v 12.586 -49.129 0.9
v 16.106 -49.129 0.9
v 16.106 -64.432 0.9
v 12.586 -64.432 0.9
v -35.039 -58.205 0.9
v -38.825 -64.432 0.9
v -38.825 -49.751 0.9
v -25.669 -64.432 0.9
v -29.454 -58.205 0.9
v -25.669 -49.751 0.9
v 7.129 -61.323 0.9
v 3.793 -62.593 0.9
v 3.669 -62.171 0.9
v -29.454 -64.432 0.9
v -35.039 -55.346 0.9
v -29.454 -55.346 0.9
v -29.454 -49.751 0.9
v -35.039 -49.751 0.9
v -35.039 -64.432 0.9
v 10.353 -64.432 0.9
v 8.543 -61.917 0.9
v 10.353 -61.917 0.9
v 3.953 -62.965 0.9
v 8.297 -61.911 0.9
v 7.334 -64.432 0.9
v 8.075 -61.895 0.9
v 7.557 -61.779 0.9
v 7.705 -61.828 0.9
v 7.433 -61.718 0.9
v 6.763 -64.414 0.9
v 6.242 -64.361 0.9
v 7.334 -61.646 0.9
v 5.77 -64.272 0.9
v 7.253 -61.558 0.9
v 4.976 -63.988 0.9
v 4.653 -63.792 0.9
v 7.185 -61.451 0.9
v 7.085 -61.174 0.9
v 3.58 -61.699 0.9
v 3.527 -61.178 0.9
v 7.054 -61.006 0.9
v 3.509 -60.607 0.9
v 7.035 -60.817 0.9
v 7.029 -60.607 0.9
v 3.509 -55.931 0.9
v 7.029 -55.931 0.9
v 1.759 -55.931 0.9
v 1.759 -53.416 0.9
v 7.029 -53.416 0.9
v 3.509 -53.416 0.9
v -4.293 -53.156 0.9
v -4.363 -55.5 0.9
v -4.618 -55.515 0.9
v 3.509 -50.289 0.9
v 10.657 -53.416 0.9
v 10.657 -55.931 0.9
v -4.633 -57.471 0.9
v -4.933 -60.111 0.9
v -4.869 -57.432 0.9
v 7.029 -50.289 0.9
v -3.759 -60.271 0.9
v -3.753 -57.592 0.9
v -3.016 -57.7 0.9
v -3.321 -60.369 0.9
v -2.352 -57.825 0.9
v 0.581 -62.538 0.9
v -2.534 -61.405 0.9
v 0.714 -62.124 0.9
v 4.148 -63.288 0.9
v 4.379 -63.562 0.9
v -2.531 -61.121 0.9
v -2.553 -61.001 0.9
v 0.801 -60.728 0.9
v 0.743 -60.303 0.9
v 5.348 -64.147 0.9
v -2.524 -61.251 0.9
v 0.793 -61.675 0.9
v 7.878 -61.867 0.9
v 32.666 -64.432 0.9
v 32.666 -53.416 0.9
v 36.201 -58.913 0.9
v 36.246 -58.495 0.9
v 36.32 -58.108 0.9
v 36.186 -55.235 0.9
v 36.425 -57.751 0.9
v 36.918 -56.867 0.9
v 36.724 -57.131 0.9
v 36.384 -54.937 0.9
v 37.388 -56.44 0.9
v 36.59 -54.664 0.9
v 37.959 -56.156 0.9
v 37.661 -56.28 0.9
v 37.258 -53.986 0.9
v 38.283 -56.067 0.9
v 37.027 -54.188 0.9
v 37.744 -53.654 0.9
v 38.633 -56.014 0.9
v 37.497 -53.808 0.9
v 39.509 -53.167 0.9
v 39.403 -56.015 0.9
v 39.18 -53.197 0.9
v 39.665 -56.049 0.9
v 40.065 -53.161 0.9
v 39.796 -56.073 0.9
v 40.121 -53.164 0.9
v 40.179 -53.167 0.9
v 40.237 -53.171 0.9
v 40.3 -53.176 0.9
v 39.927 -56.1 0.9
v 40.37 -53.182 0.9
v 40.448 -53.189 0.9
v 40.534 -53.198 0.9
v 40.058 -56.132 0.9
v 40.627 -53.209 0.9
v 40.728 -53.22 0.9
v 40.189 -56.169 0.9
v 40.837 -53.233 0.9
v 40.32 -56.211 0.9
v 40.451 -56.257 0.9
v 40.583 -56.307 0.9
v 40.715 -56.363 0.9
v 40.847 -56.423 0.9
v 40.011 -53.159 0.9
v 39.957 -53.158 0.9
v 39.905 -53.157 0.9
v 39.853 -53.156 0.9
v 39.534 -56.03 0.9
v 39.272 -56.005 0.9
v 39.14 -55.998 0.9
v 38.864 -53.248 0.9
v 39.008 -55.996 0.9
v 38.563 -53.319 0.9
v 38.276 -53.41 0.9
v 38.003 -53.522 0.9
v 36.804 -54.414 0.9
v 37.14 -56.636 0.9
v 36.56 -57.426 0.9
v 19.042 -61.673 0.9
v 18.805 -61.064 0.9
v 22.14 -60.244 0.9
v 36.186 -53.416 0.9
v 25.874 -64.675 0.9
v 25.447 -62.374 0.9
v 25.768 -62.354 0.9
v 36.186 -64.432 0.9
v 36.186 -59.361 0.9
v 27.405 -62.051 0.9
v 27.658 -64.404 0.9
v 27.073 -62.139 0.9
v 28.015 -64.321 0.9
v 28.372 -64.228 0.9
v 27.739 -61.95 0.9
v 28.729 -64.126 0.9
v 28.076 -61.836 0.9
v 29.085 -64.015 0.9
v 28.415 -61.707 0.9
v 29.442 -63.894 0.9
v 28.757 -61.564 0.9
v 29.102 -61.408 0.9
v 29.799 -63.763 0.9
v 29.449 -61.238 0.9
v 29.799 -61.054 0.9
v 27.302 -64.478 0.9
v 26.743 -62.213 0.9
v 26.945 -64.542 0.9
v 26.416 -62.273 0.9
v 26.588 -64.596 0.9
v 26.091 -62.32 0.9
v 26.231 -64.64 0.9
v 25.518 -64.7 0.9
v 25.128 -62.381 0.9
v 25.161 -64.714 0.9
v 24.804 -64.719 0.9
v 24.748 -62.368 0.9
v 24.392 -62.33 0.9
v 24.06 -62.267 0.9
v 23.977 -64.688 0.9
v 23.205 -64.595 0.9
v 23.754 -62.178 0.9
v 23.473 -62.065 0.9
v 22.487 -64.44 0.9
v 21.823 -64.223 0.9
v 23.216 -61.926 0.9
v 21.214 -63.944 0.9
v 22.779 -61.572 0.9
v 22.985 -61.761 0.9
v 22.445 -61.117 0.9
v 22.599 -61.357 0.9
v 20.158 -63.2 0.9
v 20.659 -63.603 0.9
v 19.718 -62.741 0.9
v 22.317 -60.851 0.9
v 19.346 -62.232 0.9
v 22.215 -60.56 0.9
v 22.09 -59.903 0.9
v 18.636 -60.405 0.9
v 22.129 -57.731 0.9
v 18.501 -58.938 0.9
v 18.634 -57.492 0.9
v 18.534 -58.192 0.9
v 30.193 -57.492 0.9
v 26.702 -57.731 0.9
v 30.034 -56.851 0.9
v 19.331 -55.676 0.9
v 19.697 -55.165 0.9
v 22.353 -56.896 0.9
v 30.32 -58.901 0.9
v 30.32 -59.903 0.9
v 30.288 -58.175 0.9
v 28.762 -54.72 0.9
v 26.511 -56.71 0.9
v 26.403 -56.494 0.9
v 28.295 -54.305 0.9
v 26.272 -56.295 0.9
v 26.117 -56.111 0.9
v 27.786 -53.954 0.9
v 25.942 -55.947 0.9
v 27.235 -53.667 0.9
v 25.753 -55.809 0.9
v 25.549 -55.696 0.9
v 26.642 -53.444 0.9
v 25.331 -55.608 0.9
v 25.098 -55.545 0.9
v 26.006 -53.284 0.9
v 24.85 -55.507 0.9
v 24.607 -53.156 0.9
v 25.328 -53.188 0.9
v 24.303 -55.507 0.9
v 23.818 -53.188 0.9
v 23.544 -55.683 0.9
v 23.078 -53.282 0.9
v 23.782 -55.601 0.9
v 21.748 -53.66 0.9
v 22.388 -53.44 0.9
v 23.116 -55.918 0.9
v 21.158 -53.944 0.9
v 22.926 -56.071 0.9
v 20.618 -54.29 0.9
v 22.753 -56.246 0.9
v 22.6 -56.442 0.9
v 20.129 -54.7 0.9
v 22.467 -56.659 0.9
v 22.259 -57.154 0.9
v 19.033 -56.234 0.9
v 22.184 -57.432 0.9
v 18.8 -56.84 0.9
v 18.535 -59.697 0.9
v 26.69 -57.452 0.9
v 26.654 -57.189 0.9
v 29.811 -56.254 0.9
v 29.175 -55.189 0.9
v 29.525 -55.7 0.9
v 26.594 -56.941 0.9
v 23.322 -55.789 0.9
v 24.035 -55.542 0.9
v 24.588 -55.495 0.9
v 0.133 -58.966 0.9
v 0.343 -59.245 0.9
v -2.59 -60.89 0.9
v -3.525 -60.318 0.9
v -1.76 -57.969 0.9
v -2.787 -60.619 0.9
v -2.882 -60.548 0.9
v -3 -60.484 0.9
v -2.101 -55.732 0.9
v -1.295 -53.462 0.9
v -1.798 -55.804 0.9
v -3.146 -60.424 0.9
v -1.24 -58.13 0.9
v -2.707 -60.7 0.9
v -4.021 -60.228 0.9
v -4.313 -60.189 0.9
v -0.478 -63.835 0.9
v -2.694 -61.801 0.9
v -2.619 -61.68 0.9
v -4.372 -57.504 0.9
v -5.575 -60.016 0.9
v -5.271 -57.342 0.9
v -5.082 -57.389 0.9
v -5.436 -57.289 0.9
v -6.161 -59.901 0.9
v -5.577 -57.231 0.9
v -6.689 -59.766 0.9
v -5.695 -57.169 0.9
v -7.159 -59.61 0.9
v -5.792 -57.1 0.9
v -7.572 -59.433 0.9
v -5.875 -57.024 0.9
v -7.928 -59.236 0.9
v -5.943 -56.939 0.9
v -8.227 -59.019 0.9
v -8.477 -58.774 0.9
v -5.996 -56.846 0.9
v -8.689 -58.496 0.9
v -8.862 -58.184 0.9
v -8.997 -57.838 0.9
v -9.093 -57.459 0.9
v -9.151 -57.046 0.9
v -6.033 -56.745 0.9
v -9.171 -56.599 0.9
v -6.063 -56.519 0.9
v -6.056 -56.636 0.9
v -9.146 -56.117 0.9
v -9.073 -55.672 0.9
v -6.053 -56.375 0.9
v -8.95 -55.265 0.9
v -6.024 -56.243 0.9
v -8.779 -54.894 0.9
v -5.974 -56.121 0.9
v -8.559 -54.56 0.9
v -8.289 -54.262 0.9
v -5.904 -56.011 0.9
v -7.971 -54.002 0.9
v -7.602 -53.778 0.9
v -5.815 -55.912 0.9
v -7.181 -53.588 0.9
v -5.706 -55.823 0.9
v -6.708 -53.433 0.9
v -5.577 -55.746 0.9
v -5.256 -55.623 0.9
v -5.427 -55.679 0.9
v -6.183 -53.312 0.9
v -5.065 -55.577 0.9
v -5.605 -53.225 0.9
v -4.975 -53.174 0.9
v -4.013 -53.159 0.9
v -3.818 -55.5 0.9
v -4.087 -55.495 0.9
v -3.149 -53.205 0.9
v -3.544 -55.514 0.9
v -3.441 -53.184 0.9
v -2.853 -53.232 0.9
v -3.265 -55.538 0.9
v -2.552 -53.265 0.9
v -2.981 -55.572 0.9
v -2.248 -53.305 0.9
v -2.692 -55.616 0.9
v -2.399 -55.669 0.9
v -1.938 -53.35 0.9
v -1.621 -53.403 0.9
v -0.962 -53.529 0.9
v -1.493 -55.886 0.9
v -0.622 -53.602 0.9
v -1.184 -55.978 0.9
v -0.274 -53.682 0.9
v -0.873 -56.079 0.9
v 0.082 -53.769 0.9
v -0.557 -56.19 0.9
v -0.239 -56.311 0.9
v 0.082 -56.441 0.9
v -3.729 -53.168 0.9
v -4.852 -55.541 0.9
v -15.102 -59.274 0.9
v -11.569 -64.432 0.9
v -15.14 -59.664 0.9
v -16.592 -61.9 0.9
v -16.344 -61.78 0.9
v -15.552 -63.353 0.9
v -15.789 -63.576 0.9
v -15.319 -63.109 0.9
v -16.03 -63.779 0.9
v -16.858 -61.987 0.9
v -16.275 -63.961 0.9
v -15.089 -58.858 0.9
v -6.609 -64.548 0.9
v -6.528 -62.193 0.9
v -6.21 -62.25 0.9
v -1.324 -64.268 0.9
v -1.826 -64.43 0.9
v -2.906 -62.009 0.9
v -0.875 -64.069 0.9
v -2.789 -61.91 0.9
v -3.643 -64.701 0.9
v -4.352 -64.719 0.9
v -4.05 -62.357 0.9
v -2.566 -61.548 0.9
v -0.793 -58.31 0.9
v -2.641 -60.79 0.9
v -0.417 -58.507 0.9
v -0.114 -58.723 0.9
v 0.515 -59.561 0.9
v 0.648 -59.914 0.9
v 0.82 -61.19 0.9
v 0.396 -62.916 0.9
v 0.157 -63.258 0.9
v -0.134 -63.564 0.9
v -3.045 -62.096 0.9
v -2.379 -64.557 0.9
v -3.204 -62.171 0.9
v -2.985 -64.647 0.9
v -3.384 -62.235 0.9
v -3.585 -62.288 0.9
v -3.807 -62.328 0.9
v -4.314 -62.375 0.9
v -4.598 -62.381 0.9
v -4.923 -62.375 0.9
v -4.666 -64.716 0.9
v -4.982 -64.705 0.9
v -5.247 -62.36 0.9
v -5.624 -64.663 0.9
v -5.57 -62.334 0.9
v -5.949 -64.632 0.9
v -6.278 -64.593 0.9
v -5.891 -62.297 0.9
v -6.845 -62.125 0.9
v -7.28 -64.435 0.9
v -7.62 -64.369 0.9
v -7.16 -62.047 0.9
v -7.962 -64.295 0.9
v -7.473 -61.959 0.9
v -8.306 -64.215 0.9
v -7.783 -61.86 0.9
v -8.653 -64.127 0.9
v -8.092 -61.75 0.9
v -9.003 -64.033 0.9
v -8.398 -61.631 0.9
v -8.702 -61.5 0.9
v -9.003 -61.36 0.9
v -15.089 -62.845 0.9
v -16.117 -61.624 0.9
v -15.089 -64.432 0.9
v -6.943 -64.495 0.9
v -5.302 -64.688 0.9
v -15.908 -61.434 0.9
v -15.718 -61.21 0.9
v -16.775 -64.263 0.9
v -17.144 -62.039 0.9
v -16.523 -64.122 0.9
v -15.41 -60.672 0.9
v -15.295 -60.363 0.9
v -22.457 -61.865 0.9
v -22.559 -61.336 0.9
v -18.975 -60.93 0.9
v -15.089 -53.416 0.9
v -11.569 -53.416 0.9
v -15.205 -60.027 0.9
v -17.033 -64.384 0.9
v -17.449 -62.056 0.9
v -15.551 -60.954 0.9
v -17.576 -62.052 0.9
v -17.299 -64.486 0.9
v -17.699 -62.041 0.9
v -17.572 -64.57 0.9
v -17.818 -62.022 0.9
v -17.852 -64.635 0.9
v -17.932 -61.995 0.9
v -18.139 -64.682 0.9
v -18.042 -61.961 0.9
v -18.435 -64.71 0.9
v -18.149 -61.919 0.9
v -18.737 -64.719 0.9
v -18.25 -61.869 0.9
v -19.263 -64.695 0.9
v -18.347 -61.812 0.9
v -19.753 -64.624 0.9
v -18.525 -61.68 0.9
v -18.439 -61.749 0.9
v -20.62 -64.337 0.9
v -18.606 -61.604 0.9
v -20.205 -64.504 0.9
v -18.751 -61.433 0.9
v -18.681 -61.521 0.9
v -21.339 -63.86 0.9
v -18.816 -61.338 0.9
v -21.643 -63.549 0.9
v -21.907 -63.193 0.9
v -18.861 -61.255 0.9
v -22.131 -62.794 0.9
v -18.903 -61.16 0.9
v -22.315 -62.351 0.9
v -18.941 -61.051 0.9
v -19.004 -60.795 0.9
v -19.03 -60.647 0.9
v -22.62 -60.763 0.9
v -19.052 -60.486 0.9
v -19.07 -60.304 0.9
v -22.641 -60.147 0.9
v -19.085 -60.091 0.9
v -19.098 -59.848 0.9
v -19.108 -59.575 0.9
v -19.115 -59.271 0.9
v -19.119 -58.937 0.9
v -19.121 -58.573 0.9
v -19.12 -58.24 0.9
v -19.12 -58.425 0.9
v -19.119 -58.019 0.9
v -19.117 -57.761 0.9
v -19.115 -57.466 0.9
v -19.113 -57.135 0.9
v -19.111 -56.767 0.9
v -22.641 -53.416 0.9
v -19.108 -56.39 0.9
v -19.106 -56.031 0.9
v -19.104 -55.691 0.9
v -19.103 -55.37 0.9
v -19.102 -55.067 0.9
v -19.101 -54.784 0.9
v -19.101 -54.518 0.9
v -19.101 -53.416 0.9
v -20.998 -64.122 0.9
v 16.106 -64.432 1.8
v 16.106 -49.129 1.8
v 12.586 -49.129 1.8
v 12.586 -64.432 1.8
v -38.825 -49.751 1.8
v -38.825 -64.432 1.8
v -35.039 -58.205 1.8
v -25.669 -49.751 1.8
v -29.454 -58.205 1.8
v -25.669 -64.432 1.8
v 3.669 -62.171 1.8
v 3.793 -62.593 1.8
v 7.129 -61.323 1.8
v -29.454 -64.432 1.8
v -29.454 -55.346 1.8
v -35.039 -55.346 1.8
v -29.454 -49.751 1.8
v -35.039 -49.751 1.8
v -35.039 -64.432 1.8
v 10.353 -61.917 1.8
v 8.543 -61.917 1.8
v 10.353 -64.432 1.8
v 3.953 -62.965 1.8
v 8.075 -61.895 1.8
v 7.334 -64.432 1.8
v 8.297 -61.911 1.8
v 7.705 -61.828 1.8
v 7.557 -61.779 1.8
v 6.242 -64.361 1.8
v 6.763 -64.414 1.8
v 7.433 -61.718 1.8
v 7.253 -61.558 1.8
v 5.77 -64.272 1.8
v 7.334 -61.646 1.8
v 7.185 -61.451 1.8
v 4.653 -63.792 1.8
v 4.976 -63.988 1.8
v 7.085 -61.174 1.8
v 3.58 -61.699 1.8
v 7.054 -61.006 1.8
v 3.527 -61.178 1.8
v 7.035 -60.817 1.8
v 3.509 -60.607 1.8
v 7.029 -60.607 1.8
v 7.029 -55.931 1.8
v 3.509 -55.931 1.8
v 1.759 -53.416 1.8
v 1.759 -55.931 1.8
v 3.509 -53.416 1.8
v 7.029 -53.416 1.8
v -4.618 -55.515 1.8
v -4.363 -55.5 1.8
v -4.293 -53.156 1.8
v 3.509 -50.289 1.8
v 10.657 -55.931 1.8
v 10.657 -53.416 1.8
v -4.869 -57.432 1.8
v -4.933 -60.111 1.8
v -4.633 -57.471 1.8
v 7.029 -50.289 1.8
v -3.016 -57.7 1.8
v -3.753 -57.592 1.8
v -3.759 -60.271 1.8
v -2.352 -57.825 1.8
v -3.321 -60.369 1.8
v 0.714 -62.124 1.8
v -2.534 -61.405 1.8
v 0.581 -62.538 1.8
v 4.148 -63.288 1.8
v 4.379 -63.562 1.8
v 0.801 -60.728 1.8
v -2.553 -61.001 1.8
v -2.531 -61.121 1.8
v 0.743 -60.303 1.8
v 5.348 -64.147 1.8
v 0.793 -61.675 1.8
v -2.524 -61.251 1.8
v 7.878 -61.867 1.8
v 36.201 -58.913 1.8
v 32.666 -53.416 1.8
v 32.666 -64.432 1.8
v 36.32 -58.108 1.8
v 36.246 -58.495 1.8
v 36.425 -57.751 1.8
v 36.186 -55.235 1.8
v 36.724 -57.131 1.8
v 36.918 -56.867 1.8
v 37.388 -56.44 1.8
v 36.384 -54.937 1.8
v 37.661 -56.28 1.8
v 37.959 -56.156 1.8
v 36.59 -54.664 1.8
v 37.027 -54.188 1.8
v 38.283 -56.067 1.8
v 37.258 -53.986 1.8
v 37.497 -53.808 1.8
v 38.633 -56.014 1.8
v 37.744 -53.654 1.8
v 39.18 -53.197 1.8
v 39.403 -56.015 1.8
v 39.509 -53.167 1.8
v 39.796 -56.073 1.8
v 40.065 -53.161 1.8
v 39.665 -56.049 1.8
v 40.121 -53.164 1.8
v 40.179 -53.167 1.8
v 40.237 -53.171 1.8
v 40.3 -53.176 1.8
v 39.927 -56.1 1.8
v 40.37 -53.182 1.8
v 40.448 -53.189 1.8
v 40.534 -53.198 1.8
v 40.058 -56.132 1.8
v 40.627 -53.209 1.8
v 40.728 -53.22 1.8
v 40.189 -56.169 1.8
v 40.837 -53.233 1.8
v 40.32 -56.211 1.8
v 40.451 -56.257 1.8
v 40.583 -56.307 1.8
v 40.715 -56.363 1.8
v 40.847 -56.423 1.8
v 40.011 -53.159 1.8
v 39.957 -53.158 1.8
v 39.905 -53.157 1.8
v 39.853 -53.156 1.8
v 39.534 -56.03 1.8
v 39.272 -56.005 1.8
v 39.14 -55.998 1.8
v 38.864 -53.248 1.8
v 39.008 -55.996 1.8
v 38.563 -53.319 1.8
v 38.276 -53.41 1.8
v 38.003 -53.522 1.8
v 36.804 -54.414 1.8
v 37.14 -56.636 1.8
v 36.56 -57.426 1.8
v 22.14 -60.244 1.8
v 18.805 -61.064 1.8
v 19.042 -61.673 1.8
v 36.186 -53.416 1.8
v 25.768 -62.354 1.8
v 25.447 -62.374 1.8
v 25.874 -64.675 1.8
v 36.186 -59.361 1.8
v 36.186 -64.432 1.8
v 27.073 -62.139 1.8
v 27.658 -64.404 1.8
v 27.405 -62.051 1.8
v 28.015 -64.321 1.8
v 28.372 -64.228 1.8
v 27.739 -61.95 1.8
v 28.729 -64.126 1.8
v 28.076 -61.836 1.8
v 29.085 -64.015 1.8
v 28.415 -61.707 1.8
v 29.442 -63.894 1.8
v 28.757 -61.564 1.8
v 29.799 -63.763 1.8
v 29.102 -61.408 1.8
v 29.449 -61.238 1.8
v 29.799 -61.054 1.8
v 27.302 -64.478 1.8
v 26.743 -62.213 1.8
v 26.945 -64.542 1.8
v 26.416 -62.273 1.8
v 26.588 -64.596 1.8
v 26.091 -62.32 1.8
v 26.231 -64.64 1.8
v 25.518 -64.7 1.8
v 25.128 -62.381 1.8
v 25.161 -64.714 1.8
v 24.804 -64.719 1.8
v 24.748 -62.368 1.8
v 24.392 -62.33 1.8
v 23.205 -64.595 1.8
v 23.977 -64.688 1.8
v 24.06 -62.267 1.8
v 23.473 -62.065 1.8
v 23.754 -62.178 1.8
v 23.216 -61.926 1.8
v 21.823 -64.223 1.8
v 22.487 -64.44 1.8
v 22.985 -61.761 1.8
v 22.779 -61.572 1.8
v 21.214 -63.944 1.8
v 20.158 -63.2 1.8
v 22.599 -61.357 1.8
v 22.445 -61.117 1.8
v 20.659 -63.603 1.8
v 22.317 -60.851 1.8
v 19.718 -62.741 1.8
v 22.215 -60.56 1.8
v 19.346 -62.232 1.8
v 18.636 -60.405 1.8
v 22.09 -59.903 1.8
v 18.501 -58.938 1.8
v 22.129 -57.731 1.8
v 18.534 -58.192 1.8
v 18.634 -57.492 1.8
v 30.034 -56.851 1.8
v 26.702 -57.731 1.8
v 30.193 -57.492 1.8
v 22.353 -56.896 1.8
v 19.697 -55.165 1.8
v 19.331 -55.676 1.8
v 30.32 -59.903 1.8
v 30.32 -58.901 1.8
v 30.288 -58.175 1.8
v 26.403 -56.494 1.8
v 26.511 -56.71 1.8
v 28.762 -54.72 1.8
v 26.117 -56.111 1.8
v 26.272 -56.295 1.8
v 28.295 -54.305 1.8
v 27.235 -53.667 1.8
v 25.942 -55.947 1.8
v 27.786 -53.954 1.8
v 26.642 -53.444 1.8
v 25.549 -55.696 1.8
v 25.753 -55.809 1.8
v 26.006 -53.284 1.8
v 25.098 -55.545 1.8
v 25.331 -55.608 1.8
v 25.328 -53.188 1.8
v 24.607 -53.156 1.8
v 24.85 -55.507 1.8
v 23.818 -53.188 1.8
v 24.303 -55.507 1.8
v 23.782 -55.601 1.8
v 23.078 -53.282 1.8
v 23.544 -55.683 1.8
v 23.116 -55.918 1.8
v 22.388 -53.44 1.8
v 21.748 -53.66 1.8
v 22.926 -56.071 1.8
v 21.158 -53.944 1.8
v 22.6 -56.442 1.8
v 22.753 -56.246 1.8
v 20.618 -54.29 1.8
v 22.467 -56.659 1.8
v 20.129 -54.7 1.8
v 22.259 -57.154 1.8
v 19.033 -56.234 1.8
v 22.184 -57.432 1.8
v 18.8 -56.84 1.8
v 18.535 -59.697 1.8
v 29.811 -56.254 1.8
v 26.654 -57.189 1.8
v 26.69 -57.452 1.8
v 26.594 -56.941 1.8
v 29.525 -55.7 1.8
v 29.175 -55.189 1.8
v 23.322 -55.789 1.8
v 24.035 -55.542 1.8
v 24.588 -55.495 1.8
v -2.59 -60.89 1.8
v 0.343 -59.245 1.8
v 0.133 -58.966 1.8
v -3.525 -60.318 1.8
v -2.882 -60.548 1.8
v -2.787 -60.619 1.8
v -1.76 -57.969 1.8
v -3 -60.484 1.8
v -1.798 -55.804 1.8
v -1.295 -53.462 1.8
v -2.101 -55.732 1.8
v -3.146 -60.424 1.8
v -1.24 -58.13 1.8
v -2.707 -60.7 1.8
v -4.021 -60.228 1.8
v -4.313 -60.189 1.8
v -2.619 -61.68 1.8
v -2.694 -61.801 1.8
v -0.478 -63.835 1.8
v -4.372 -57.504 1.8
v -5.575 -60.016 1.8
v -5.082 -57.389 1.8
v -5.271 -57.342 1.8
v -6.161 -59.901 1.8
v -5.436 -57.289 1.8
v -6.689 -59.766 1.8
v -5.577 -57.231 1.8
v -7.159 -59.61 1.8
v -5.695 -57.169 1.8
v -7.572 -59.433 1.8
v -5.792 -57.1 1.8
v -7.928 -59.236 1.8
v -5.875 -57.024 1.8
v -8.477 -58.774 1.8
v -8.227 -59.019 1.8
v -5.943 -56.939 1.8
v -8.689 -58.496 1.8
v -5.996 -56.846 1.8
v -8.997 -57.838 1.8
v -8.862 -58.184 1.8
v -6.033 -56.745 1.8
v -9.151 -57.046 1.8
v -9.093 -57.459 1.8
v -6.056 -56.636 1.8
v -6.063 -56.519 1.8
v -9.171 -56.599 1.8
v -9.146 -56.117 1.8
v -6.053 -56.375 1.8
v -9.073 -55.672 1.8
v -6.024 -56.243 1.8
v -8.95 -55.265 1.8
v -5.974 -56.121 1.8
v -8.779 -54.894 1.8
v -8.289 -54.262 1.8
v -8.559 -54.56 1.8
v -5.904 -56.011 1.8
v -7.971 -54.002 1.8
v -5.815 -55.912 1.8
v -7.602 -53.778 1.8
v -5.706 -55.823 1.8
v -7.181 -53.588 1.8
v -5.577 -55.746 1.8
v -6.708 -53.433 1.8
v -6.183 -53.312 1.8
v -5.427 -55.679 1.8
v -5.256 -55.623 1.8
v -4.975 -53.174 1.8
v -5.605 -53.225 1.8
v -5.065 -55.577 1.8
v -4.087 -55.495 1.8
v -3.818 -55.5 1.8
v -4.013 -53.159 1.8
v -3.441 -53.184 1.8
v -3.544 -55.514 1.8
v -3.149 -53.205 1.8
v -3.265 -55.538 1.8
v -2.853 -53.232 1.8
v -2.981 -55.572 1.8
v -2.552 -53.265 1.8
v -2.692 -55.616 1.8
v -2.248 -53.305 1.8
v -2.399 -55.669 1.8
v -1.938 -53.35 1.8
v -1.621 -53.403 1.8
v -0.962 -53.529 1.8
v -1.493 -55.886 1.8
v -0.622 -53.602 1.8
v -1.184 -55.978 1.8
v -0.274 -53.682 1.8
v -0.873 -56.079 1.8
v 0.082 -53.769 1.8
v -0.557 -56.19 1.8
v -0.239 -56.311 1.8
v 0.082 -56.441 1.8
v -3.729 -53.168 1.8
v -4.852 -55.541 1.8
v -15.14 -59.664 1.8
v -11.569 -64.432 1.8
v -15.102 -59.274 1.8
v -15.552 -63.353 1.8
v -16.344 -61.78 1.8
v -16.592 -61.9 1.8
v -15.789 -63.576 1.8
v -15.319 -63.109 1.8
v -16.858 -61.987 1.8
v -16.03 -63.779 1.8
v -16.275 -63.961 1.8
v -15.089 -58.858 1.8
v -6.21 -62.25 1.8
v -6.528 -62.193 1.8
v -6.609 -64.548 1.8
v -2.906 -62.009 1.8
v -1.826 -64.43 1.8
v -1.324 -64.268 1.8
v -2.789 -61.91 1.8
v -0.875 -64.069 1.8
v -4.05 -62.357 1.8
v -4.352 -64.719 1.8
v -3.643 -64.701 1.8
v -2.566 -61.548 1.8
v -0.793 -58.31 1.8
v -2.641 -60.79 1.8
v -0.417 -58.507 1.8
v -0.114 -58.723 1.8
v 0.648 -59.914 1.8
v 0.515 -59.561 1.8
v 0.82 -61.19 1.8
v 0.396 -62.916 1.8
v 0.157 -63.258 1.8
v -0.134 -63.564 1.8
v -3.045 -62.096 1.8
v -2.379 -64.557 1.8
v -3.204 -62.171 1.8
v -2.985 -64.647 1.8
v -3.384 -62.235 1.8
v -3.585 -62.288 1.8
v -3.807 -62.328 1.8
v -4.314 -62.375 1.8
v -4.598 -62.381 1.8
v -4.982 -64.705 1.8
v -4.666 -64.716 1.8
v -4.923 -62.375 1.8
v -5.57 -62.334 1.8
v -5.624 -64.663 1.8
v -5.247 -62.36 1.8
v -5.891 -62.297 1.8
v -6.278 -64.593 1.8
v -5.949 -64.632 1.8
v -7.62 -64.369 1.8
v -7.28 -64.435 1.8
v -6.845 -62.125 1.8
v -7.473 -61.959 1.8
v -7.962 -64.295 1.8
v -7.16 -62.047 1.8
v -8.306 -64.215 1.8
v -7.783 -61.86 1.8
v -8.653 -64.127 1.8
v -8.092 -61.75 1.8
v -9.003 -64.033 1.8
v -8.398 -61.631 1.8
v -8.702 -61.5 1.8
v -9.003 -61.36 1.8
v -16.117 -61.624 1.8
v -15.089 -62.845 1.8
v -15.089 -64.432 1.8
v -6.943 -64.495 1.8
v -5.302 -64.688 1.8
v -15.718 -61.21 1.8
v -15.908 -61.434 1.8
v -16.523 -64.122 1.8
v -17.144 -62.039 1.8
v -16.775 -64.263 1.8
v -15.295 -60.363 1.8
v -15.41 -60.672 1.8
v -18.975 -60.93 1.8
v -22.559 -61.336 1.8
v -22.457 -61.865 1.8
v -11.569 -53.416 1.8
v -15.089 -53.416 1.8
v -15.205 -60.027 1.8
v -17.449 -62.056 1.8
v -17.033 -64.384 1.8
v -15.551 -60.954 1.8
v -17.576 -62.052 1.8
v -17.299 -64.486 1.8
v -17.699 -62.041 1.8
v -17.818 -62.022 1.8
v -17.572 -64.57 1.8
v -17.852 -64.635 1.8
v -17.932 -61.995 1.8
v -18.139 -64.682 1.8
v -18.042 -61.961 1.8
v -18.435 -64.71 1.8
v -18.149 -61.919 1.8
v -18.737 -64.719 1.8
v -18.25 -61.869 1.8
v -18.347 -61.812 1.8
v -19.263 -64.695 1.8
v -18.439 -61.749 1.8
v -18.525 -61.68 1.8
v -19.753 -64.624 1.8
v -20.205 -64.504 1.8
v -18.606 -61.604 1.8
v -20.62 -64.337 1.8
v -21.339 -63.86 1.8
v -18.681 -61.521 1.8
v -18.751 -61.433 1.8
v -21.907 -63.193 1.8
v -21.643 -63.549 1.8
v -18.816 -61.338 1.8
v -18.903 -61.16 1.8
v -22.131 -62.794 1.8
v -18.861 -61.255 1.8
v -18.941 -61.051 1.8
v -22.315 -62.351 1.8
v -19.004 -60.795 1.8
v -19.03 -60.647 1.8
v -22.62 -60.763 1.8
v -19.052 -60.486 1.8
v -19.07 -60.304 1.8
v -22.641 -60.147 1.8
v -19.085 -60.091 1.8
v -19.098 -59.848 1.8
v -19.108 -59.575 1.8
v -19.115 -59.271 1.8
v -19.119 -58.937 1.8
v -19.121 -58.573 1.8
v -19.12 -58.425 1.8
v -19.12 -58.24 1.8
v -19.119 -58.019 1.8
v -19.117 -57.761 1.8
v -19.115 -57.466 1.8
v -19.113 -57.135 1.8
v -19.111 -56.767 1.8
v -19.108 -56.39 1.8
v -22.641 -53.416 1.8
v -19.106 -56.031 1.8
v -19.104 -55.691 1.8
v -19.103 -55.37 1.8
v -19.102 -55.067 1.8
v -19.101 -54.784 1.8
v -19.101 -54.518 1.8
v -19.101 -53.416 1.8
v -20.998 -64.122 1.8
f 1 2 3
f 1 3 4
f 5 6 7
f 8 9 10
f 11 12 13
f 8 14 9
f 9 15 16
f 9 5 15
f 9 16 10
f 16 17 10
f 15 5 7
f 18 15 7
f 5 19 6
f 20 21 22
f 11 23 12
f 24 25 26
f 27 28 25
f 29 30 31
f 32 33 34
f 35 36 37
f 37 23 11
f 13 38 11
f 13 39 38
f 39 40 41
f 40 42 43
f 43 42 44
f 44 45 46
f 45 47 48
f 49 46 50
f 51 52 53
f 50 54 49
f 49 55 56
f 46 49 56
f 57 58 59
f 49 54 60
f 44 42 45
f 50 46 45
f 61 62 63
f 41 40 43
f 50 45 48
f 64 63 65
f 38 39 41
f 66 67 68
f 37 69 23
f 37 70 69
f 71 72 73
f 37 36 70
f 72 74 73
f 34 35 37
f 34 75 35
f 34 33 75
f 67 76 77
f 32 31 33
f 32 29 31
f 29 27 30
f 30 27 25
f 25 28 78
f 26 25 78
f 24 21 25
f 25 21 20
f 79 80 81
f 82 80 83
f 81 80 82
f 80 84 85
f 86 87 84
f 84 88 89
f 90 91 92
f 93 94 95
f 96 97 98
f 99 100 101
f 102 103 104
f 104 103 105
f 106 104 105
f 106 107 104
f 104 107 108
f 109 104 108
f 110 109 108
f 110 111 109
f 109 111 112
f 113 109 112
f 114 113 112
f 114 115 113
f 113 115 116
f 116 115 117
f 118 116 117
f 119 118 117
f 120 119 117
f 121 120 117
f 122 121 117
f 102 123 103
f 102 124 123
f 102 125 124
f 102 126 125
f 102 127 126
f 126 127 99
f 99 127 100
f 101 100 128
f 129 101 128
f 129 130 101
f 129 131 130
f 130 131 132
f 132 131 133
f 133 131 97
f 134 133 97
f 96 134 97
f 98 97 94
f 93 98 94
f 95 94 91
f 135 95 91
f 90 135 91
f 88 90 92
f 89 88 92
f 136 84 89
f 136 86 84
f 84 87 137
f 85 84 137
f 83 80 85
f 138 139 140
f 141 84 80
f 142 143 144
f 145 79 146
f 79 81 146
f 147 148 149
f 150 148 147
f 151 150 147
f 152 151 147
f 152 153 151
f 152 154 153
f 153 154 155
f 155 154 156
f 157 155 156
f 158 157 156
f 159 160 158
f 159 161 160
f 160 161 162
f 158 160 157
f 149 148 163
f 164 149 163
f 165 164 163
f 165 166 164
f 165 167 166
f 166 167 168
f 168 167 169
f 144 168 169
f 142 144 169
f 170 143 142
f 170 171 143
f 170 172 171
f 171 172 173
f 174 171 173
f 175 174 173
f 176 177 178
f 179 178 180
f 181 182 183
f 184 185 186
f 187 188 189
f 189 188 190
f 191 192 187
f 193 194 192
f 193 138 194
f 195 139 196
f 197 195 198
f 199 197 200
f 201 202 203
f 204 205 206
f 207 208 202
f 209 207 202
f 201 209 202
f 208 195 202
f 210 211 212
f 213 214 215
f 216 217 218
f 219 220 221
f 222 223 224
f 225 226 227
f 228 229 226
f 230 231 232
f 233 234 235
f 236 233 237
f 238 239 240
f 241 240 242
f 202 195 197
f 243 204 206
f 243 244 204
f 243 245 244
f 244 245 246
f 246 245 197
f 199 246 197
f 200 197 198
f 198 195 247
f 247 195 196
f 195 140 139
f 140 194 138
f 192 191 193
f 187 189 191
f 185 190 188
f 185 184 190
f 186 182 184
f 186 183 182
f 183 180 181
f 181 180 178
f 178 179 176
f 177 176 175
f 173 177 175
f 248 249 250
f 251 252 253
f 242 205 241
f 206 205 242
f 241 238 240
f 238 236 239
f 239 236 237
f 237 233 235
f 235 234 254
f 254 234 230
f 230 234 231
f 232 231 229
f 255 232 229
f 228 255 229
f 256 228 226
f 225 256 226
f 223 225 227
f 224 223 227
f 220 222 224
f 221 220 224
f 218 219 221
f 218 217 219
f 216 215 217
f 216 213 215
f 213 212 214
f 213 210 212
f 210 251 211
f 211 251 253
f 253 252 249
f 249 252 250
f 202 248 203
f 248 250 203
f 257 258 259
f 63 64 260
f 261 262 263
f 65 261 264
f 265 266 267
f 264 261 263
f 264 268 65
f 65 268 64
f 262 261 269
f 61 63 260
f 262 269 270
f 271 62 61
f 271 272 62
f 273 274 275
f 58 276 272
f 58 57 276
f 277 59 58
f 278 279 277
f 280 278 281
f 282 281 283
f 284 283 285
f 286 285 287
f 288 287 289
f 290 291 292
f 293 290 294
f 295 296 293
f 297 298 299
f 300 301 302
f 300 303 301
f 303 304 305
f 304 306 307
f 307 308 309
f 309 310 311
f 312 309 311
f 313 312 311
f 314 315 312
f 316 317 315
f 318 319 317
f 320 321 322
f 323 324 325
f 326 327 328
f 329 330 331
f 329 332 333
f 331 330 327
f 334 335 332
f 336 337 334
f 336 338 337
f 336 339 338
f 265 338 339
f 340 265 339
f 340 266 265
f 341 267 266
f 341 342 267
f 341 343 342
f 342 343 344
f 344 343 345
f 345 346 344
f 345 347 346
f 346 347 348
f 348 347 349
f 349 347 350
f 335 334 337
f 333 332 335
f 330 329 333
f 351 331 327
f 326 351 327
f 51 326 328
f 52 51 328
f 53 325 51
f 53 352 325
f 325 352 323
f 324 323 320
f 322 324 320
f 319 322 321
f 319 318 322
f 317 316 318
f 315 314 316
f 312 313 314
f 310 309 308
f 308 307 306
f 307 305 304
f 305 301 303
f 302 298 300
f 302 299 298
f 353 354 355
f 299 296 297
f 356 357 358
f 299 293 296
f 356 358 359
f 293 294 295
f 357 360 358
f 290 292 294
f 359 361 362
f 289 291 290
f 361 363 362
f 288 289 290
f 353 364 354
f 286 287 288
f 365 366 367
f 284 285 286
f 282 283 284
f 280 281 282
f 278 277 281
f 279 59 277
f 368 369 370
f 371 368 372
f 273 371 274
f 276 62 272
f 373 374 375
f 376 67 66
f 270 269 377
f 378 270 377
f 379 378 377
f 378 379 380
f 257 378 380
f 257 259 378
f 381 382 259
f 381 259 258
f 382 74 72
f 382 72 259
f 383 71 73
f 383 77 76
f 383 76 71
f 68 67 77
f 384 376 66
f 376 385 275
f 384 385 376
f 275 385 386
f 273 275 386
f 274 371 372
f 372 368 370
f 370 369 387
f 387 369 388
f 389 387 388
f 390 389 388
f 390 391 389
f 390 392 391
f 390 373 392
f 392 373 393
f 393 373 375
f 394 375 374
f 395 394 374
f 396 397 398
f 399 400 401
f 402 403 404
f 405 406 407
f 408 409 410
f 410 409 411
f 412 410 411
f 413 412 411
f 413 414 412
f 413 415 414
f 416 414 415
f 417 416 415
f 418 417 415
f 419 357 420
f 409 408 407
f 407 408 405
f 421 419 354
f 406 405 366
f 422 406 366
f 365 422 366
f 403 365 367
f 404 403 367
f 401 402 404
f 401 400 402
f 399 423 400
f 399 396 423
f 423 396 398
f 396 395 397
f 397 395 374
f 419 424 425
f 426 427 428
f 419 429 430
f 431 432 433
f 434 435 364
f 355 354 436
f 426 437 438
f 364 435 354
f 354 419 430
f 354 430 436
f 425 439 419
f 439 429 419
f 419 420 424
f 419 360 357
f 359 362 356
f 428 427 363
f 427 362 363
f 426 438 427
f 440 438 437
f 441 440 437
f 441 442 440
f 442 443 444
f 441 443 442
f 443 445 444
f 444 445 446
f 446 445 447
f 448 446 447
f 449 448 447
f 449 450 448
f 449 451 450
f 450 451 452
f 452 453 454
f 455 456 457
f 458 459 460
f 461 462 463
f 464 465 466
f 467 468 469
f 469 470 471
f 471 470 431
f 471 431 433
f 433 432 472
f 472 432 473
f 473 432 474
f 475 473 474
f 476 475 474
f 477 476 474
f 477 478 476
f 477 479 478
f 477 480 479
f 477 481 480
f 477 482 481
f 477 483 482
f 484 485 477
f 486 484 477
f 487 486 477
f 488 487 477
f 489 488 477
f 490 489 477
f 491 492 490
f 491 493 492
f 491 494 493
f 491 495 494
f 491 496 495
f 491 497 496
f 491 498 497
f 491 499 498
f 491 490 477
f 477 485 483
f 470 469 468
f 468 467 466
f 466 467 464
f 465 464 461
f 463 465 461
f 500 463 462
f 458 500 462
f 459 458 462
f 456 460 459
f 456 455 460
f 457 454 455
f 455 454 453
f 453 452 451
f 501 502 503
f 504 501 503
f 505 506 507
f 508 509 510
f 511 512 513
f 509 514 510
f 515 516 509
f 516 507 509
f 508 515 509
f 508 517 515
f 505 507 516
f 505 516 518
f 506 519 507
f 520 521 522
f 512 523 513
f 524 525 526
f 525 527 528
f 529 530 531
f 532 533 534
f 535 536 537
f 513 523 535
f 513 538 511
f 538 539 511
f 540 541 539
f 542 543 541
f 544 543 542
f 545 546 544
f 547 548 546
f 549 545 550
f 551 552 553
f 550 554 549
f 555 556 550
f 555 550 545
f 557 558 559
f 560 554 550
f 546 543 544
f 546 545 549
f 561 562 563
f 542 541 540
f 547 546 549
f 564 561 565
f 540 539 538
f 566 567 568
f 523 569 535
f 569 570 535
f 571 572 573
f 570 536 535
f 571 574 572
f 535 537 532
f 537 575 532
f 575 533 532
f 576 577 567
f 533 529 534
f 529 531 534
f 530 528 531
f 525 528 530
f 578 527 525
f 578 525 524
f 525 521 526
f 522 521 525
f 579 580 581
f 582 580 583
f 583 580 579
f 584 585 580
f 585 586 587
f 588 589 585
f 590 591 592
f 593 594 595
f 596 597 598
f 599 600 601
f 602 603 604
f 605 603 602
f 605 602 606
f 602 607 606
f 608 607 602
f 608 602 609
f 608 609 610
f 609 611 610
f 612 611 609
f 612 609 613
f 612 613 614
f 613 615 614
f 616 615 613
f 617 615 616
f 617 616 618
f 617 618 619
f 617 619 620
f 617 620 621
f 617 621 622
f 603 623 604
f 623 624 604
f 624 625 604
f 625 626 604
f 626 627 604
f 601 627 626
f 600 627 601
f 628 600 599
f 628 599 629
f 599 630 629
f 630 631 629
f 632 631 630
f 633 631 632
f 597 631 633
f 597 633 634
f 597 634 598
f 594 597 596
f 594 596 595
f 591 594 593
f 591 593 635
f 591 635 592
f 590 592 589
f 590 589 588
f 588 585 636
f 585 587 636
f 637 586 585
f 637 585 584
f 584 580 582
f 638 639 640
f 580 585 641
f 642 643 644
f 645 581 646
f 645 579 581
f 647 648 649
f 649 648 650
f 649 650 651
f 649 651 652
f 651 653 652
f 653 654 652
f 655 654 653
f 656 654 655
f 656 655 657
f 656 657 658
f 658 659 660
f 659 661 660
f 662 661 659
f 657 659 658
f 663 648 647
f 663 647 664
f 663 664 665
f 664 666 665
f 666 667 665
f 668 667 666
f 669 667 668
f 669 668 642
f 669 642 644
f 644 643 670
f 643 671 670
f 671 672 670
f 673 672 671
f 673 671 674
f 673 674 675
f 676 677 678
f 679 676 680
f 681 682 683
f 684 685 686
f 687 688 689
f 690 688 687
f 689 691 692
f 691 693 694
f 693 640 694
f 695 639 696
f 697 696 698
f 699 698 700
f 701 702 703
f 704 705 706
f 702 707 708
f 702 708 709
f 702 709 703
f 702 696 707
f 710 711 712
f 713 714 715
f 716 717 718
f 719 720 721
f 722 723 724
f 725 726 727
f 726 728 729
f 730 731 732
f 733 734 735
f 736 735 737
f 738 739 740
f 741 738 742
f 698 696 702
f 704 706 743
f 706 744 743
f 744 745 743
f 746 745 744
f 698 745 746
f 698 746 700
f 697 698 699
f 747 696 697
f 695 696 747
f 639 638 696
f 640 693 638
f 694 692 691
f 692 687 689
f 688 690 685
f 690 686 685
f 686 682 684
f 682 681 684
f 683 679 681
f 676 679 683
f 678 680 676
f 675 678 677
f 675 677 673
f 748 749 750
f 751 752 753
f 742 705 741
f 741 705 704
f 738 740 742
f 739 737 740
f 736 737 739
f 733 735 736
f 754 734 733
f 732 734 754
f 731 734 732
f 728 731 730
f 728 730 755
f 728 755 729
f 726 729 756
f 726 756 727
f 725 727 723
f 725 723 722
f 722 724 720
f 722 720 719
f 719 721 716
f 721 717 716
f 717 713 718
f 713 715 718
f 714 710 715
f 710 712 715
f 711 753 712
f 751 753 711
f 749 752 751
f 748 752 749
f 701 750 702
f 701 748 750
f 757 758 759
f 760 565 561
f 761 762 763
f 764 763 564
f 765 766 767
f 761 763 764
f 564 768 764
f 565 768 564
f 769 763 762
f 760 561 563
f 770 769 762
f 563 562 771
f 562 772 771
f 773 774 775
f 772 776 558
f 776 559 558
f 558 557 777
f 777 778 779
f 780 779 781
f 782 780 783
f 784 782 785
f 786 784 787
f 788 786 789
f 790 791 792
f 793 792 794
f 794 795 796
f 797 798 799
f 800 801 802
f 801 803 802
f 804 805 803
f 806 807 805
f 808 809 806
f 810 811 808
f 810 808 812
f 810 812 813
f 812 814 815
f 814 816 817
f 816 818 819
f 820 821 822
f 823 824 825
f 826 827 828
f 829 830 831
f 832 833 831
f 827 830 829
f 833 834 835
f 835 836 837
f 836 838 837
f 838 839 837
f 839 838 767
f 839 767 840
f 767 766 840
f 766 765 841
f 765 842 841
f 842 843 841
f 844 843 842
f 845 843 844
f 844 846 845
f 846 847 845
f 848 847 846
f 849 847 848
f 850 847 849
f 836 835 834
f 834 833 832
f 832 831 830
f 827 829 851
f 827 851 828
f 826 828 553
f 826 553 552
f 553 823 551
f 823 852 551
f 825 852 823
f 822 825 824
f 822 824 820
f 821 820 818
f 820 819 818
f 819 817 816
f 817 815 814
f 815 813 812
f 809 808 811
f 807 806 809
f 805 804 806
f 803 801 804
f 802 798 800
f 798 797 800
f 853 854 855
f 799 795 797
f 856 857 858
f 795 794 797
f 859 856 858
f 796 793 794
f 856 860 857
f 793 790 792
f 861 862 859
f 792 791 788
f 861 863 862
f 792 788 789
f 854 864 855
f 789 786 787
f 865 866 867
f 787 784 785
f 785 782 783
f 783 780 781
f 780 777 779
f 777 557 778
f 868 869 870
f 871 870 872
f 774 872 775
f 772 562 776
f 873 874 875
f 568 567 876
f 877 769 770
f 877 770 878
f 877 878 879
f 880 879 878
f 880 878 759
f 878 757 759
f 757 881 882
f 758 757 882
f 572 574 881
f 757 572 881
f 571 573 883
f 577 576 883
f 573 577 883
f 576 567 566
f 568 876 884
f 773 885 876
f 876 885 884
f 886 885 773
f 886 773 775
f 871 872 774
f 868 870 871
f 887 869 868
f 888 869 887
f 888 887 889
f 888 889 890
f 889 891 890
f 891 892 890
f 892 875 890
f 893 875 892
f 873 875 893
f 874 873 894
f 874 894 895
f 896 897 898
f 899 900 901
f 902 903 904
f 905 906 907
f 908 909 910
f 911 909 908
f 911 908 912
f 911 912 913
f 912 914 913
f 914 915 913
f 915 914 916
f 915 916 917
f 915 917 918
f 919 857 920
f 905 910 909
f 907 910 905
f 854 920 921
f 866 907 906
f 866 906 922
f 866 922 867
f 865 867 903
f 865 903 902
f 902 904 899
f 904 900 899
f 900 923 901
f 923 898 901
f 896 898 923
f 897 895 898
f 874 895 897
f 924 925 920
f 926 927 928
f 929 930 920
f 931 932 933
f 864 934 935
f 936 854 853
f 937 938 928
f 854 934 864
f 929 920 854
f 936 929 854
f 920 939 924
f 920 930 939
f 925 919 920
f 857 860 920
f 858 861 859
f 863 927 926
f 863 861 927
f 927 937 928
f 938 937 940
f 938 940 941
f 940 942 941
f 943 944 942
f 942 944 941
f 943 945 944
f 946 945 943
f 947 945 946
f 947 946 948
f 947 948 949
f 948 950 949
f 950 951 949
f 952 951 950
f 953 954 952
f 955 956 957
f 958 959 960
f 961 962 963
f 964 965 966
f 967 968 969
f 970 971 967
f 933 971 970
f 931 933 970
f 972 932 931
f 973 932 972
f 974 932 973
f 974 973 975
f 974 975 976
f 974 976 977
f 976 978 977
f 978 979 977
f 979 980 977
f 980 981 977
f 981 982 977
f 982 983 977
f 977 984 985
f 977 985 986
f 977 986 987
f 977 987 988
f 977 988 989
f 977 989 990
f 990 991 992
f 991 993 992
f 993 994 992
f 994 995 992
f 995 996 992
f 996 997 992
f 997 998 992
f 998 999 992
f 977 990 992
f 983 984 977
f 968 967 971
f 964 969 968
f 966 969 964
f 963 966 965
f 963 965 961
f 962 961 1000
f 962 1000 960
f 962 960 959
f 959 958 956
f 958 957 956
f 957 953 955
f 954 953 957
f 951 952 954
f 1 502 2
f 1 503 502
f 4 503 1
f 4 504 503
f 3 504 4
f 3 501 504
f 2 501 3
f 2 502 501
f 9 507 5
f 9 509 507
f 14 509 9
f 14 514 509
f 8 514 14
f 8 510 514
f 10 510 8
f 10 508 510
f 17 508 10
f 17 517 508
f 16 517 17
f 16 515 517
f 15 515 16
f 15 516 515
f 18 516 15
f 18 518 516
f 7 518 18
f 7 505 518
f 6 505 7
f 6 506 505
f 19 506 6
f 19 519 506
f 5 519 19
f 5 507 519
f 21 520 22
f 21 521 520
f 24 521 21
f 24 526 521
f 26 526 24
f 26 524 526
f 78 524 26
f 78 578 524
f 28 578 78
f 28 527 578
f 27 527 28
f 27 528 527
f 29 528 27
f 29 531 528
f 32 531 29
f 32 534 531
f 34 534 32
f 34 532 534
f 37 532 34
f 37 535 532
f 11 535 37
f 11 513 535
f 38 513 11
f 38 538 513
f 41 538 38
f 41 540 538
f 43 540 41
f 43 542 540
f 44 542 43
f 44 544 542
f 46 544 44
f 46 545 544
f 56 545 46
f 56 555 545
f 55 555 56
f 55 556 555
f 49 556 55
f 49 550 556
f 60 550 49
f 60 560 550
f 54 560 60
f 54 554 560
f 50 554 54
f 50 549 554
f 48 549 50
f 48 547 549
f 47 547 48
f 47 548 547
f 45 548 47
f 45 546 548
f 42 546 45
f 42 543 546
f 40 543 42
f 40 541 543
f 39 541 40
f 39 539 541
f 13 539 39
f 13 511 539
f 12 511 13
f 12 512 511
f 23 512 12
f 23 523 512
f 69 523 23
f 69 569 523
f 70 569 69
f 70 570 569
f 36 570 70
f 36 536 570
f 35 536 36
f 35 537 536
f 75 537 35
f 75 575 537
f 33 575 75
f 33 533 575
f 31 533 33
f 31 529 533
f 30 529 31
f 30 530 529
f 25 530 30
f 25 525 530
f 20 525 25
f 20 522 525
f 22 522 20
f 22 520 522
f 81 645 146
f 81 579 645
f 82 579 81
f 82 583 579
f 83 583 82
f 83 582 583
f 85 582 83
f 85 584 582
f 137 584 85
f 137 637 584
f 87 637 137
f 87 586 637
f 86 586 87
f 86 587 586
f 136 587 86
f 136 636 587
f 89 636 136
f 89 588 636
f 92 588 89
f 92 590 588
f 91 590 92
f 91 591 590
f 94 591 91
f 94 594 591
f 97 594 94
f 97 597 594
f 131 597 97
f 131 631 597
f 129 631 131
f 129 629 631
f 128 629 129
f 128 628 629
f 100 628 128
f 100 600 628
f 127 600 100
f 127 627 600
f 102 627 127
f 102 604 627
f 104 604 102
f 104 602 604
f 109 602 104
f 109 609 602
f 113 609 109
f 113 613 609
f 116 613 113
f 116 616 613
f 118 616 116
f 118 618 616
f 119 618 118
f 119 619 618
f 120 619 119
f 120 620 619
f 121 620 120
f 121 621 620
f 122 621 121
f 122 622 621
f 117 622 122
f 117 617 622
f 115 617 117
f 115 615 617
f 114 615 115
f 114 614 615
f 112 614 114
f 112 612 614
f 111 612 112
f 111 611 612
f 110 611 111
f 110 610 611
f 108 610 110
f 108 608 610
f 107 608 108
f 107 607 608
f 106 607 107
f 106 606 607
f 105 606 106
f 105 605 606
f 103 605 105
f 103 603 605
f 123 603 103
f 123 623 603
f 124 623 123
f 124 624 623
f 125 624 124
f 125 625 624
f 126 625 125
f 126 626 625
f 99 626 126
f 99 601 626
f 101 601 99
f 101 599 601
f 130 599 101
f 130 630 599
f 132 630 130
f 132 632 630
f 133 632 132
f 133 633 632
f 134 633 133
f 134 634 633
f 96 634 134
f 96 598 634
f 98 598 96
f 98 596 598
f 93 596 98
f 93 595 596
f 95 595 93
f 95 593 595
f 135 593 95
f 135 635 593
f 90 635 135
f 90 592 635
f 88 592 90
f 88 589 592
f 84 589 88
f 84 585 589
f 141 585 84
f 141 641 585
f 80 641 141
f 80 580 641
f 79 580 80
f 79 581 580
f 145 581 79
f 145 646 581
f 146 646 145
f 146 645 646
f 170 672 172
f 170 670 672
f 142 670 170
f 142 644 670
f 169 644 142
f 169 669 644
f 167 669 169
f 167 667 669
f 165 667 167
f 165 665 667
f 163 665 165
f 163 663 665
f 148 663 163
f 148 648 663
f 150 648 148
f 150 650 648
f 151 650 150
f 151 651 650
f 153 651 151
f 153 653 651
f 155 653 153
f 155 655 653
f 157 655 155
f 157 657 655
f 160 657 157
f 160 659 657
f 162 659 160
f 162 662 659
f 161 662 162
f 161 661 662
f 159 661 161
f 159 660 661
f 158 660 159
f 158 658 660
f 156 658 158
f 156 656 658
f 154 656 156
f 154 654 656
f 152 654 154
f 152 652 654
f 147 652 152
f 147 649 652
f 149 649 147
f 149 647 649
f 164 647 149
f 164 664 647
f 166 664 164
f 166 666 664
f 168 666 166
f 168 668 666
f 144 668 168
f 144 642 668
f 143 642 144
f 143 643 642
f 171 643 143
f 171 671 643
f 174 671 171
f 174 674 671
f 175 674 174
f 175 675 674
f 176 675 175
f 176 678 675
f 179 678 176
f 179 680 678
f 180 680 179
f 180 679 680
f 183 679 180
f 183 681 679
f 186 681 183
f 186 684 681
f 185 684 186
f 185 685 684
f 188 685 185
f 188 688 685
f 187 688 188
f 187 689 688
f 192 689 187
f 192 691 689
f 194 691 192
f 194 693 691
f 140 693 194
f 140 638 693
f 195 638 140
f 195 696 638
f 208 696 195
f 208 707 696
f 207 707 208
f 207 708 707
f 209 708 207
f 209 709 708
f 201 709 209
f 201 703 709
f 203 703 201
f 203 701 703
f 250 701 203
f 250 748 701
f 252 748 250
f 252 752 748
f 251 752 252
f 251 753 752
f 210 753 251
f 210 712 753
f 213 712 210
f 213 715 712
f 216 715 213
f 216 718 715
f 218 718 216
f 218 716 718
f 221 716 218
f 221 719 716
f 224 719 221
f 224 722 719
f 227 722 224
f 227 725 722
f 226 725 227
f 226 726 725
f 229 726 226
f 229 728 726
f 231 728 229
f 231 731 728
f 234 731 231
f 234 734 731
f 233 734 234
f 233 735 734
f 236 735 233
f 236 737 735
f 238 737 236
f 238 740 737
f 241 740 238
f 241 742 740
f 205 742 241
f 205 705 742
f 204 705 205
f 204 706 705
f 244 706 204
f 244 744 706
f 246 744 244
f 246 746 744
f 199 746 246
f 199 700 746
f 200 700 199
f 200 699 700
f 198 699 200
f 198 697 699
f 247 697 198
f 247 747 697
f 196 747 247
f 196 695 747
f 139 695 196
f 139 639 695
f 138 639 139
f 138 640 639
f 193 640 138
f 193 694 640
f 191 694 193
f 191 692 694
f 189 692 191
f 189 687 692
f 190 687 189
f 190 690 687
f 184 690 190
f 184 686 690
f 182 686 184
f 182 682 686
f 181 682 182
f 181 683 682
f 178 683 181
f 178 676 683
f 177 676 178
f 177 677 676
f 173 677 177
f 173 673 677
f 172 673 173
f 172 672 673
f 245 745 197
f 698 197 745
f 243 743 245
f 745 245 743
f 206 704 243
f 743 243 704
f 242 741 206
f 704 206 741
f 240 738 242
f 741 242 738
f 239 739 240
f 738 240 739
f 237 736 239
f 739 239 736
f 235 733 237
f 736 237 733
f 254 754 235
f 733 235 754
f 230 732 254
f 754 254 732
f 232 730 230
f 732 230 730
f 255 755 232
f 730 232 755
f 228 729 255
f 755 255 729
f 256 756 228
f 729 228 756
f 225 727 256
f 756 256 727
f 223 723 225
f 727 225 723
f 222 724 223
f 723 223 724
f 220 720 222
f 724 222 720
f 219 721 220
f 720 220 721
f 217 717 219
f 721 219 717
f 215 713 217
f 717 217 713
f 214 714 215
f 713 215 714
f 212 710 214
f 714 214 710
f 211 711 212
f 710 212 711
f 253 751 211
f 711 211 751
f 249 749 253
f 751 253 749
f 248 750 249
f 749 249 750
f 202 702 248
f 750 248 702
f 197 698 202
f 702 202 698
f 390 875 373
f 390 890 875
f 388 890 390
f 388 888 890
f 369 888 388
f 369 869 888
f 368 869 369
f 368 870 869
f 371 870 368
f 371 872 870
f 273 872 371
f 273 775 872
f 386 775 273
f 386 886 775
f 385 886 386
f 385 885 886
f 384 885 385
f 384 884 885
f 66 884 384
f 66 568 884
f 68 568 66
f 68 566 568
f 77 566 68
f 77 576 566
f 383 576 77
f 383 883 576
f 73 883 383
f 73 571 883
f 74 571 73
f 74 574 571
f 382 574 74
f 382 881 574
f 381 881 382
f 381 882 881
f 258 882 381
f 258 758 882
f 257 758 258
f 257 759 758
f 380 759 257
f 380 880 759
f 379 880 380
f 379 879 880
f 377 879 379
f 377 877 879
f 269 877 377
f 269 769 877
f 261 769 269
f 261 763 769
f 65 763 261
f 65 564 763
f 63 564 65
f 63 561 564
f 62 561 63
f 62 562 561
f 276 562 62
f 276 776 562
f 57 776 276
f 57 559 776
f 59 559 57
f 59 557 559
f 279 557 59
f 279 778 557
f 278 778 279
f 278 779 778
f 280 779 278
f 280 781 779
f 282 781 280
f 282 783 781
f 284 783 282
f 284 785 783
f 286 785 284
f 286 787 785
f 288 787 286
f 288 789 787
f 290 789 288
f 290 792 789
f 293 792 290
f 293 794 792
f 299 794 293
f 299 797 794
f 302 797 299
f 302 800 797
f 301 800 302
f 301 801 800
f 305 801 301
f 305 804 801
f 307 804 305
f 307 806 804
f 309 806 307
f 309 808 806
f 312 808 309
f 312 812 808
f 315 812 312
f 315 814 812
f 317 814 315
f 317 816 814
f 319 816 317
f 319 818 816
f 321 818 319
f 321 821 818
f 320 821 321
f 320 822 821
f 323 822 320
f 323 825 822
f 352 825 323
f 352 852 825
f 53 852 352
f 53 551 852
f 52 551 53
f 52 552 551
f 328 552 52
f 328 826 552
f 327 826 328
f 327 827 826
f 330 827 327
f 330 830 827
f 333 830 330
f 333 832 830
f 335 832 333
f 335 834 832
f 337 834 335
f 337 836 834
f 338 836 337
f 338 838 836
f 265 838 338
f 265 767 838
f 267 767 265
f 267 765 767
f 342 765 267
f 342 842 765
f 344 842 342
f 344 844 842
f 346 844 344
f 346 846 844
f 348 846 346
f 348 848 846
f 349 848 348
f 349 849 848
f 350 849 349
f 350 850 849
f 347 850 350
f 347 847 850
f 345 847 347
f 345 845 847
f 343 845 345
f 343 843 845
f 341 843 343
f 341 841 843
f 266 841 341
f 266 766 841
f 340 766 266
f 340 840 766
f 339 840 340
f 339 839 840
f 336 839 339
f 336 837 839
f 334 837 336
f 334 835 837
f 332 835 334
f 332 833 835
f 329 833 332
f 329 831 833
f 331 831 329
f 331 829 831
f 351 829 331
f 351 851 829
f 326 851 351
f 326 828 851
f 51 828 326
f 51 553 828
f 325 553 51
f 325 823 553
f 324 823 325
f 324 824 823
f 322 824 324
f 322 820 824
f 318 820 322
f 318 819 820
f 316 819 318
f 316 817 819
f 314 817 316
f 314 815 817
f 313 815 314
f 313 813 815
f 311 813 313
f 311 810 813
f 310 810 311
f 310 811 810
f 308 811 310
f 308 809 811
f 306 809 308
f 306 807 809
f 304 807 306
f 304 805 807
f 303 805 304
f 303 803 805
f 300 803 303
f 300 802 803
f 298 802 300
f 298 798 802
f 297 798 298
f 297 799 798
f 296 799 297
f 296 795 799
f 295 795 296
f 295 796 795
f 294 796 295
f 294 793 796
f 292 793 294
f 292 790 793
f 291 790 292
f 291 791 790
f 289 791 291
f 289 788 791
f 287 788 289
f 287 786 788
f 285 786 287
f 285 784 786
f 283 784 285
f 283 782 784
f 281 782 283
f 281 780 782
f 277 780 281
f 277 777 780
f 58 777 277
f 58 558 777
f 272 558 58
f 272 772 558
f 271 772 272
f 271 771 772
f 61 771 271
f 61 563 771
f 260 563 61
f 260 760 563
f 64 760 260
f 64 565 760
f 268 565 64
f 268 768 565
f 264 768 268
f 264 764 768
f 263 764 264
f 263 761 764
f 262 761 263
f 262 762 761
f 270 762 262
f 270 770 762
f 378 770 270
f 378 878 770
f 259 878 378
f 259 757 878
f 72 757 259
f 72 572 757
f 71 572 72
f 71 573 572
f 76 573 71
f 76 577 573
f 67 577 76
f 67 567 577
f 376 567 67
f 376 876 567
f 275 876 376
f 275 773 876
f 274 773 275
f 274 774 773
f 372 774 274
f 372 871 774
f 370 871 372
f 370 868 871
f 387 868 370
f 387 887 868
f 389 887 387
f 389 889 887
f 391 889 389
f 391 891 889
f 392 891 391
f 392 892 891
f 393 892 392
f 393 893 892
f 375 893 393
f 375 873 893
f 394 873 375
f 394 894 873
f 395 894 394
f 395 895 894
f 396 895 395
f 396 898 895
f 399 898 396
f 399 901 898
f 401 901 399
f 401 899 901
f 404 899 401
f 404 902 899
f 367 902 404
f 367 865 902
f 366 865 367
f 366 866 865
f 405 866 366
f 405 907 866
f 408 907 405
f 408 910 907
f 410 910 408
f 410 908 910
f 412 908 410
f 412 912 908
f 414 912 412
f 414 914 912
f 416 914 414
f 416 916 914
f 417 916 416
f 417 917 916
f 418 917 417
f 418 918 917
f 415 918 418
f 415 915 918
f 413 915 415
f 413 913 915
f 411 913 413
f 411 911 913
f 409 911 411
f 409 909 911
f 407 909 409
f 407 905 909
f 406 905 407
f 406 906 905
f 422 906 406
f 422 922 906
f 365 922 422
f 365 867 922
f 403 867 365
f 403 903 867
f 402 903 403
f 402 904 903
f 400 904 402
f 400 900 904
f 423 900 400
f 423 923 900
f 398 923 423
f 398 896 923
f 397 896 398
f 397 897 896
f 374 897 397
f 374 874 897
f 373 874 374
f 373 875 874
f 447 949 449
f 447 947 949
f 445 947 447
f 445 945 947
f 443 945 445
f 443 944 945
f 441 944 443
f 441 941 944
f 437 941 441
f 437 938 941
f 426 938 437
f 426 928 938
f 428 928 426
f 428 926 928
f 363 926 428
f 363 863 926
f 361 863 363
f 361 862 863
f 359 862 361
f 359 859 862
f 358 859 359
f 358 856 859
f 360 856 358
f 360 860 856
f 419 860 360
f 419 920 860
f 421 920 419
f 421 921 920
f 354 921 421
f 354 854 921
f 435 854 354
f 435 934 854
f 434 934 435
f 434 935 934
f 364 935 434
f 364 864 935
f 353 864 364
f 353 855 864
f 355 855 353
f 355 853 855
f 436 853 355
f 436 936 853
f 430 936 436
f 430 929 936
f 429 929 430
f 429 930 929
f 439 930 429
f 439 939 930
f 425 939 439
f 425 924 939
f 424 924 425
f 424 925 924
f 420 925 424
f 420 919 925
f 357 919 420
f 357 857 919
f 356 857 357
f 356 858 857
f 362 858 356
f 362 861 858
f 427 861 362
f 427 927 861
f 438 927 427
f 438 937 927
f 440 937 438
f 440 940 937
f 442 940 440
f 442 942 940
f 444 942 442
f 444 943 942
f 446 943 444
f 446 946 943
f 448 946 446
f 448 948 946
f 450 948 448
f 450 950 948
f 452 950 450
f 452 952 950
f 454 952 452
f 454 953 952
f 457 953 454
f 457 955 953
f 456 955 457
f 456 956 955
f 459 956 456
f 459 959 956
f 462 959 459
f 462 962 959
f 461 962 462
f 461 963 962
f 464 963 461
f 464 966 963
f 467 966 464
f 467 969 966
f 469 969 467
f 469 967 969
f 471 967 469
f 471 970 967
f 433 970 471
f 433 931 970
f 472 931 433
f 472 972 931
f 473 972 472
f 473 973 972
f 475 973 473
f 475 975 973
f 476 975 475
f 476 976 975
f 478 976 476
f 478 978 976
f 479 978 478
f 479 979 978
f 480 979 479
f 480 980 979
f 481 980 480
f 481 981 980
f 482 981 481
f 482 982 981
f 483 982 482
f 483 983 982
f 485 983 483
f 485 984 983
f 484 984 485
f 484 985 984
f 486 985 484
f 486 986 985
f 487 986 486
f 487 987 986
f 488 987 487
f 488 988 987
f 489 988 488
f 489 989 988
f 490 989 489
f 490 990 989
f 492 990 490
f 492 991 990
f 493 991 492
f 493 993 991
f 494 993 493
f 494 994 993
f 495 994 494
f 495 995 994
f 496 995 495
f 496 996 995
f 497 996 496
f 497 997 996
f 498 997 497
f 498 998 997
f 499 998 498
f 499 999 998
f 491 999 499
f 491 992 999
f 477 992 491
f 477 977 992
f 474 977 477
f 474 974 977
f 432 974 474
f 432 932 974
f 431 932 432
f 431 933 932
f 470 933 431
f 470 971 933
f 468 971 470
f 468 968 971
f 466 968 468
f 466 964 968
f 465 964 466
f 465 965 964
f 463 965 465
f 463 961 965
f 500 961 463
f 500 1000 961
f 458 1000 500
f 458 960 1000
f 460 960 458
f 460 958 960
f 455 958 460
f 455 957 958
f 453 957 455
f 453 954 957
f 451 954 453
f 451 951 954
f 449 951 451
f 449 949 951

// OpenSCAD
$fn = 48;
  // English (below bottom hole)
  translate([0, -57.100, 0.900]) linear_extrude(height=0.900) text("Hustler", size=14.500, halign="center", valign="center", font="Helvetica Neue:style=Bold");
